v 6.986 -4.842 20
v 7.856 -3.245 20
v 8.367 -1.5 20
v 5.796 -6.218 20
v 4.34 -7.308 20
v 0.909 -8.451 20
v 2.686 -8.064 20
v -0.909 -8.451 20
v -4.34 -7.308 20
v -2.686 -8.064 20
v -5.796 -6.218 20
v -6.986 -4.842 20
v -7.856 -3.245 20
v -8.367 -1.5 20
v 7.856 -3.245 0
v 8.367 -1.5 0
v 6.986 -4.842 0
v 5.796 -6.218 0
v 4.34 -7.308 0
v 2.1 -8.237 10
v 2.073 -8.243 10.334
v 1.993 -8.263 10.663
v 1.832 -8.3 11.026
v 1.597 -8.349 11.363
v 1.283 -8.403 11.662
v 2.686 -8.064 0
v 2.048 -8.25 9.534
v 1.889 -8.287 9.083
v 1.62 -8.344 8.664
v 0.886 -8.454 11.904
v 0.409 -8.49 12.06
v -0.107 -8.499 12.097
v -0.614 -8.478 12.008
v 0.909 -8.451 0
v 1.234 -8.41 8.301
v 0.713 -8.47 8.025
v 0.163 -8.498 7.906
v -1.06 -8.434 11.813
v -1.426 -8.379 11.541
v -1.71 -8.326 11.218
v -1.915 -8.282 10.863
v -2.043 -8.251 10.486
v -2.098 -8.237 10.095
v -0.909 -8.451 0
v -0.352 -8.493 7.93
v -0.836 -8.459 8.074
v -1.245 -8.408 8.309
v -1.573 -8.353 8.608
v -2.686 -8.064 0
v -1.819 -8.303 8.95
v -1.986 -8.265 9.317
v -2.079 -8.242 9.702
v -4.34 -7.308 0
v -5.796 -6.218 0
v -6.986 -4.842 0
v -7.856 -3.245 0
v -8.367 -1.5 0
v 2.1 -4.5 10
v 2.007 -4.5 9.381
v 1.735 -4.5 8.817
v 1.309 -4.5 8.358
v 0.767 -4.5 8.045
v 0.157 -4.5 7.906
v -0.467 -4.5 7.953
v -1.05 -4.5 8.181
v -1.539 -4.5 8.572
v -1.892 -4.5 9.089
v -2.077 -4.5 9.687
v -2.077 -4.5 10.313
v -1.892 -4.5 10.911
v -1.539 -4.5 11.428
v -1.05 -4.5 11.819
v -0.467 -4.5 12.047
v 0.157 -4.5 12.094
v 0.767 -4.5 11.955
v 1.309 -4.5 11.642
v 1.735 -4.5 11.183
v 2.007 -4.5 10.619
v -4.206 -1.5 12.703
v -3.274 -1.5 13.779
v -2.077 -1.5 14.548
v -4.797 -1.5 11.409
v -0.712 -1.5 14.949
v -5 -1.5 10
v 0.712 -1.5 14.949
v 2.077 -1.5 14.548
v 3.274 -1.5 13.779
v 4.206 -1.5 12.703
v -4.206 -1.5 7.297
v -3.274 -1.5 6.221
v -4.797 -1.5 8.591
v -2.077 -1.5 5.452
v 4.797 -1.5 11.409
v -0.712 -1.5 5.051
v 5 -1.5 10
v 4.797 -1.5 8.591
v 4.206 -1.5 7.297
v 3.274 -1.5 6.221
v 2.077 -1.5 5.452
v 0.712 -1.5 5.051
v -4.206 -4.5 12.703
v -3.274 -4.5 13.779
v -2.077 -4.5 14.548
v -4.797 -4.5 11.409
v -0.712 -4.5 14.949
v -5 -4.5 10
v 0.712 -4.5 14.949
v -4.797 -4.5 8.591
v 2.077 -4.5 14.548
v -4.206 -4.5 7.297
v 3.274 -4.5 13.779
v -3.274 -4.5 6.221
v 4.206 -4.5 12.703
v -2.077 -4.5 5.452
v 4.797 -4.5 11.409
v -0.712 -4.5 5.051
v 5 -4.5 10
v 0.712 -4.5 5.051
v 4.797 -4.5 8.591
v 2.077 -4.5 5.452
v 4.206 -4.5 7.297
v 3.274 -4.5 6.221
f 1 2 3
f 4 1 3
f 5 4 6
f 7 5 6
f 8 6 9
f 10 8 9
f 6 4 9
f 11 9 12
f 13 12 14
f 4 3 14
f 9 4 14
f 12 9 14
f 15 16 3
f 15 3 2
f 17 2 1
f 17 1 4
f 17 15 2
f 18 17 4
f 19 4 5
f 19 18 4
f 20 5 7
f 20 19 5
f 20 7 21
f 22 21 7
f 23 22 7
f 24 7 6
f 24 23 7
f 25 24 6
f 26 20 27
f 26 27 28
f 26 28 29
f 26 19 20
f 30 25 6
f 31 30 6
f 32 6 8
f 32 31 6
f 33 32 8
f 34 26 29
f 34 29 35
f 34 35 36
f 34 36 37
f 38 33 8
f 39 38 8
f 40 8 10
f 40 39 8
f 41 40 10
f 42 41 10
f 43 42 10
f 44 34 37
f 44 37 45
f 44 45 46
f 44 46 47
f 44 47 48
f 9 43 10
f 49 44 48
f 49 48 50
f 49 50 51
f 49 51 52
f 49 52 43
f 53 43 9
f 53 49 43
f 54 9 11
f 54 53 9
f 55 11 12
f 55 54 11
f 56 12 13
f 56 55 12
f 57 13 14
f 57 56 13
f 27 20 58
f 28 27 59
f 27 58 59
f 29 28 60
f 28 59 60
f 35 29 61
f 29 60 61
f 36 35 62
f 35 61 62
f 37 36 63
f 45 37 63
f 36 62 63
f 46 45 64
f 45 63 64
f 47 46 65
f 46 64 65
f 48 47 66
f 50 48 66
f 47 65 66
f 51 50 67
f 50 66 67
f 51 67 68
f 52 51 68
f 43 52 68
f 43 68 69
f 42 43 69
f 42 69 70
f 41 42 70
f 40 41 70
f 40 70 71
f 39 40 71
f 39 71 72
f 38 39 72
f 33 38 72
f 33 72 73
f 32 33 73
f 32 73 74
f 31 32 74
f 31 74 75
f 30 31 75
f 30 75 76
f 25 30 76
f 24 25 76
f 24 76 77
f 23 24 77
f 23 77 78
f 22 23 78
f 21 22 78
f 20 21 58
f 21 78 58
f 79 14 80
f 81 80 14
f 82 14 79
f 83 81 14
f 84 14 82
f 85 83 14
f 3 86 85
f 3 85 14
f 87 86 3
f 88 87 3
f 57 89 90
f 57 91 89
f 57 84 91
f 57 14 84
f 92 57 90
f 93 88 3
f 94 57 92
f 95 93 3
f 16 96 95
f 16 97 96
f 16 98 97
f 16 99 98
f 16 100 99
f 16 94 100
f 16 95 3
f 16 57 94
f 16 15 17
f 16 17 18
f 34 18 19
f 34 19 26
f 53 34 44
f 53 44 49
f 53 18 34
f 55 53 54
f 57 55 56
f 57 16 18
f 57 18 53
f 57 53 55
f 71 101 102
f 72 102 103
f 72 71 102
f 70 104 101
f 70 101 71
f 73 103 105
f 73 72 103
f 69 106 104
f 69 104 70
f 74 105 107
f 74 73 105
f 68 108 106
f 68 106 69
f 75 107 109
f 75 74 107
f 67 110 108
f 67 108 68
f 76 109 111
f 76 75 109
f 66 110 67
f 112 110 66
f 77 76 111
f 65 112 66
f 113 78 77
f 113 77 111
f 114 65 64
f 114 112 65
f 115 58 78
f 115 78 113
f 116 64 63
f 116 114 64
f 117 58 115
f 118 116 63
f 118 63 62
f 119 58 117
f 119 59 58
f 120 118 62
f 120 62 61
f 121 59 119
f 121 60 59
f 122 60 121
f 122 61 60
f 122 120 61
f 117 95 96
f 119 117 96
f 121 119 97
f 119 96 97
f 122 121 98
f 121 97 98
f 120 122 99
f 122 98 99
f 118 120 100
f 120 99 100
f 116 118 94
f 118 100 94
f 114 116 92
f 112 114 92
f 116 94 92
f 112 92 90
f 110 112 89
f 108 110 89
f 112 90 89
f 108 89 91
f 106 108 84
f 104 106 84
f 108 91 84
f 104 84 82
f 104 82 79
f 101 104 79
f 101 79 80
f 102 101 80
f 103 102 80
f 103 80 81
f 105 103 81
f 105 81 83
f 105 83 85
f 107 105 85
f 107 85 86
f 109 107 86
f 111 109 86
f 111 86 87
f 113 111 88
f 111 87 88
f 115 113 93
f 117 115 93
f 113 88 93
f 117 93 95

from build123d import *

# Parameters (mm, degrees)
BOSS_EXTRUDE1_DEPTH = 20
SKETCH2_R           = 2.1
CUT_EXTRUDE1_DEPTH  = 8
SKETCH3_R           = 5
CUT_EXTRUDE2_DEPTH  = 3


with BuildPart() as part:
    # Sketch1 → Boss-Extrude1 (new body)
    with BuildSketch(Plane.XY):
        with BuildLine():
            Line((-8.366600265, -1.5), (8.366600265, -1.5))
            ThreePointArc((8.366600265, -1.5), (0, -8.5), (-8.366600265, -1.5))
        make_face()
    extrude(amount=BOSS_EXTRUDE1_DEPTH)

    # Sketch2 → Cut-Extrude1 (cut, through all)
    with BuildSketch(Plane(origin=(0, -1.5, 0), x_dir=(1, 0, 0), z_dir=(0, 1, 0))):
        with Locations((0, -10)):
            Circle(SKETCH2_R)
    extrude(amount=-CUT_EXTRUDE1_DEPTH, mode=Mode.SUBTRACT)

    # Sketch3 → Cut-Extrude2 (cut)
    with BuildSketch(Plane(origin=(0, -1.5, 0), x_dir=(1, 0, 0), z_dir=(0, 1, 0))):
        with Locations((0, -10)):
            Circle(SKETCH3_R)
    extrude(amount=-CUT_EXTRUDE2_DEPTH, mode=Mode.SUBTRACT)


solid = part.part
